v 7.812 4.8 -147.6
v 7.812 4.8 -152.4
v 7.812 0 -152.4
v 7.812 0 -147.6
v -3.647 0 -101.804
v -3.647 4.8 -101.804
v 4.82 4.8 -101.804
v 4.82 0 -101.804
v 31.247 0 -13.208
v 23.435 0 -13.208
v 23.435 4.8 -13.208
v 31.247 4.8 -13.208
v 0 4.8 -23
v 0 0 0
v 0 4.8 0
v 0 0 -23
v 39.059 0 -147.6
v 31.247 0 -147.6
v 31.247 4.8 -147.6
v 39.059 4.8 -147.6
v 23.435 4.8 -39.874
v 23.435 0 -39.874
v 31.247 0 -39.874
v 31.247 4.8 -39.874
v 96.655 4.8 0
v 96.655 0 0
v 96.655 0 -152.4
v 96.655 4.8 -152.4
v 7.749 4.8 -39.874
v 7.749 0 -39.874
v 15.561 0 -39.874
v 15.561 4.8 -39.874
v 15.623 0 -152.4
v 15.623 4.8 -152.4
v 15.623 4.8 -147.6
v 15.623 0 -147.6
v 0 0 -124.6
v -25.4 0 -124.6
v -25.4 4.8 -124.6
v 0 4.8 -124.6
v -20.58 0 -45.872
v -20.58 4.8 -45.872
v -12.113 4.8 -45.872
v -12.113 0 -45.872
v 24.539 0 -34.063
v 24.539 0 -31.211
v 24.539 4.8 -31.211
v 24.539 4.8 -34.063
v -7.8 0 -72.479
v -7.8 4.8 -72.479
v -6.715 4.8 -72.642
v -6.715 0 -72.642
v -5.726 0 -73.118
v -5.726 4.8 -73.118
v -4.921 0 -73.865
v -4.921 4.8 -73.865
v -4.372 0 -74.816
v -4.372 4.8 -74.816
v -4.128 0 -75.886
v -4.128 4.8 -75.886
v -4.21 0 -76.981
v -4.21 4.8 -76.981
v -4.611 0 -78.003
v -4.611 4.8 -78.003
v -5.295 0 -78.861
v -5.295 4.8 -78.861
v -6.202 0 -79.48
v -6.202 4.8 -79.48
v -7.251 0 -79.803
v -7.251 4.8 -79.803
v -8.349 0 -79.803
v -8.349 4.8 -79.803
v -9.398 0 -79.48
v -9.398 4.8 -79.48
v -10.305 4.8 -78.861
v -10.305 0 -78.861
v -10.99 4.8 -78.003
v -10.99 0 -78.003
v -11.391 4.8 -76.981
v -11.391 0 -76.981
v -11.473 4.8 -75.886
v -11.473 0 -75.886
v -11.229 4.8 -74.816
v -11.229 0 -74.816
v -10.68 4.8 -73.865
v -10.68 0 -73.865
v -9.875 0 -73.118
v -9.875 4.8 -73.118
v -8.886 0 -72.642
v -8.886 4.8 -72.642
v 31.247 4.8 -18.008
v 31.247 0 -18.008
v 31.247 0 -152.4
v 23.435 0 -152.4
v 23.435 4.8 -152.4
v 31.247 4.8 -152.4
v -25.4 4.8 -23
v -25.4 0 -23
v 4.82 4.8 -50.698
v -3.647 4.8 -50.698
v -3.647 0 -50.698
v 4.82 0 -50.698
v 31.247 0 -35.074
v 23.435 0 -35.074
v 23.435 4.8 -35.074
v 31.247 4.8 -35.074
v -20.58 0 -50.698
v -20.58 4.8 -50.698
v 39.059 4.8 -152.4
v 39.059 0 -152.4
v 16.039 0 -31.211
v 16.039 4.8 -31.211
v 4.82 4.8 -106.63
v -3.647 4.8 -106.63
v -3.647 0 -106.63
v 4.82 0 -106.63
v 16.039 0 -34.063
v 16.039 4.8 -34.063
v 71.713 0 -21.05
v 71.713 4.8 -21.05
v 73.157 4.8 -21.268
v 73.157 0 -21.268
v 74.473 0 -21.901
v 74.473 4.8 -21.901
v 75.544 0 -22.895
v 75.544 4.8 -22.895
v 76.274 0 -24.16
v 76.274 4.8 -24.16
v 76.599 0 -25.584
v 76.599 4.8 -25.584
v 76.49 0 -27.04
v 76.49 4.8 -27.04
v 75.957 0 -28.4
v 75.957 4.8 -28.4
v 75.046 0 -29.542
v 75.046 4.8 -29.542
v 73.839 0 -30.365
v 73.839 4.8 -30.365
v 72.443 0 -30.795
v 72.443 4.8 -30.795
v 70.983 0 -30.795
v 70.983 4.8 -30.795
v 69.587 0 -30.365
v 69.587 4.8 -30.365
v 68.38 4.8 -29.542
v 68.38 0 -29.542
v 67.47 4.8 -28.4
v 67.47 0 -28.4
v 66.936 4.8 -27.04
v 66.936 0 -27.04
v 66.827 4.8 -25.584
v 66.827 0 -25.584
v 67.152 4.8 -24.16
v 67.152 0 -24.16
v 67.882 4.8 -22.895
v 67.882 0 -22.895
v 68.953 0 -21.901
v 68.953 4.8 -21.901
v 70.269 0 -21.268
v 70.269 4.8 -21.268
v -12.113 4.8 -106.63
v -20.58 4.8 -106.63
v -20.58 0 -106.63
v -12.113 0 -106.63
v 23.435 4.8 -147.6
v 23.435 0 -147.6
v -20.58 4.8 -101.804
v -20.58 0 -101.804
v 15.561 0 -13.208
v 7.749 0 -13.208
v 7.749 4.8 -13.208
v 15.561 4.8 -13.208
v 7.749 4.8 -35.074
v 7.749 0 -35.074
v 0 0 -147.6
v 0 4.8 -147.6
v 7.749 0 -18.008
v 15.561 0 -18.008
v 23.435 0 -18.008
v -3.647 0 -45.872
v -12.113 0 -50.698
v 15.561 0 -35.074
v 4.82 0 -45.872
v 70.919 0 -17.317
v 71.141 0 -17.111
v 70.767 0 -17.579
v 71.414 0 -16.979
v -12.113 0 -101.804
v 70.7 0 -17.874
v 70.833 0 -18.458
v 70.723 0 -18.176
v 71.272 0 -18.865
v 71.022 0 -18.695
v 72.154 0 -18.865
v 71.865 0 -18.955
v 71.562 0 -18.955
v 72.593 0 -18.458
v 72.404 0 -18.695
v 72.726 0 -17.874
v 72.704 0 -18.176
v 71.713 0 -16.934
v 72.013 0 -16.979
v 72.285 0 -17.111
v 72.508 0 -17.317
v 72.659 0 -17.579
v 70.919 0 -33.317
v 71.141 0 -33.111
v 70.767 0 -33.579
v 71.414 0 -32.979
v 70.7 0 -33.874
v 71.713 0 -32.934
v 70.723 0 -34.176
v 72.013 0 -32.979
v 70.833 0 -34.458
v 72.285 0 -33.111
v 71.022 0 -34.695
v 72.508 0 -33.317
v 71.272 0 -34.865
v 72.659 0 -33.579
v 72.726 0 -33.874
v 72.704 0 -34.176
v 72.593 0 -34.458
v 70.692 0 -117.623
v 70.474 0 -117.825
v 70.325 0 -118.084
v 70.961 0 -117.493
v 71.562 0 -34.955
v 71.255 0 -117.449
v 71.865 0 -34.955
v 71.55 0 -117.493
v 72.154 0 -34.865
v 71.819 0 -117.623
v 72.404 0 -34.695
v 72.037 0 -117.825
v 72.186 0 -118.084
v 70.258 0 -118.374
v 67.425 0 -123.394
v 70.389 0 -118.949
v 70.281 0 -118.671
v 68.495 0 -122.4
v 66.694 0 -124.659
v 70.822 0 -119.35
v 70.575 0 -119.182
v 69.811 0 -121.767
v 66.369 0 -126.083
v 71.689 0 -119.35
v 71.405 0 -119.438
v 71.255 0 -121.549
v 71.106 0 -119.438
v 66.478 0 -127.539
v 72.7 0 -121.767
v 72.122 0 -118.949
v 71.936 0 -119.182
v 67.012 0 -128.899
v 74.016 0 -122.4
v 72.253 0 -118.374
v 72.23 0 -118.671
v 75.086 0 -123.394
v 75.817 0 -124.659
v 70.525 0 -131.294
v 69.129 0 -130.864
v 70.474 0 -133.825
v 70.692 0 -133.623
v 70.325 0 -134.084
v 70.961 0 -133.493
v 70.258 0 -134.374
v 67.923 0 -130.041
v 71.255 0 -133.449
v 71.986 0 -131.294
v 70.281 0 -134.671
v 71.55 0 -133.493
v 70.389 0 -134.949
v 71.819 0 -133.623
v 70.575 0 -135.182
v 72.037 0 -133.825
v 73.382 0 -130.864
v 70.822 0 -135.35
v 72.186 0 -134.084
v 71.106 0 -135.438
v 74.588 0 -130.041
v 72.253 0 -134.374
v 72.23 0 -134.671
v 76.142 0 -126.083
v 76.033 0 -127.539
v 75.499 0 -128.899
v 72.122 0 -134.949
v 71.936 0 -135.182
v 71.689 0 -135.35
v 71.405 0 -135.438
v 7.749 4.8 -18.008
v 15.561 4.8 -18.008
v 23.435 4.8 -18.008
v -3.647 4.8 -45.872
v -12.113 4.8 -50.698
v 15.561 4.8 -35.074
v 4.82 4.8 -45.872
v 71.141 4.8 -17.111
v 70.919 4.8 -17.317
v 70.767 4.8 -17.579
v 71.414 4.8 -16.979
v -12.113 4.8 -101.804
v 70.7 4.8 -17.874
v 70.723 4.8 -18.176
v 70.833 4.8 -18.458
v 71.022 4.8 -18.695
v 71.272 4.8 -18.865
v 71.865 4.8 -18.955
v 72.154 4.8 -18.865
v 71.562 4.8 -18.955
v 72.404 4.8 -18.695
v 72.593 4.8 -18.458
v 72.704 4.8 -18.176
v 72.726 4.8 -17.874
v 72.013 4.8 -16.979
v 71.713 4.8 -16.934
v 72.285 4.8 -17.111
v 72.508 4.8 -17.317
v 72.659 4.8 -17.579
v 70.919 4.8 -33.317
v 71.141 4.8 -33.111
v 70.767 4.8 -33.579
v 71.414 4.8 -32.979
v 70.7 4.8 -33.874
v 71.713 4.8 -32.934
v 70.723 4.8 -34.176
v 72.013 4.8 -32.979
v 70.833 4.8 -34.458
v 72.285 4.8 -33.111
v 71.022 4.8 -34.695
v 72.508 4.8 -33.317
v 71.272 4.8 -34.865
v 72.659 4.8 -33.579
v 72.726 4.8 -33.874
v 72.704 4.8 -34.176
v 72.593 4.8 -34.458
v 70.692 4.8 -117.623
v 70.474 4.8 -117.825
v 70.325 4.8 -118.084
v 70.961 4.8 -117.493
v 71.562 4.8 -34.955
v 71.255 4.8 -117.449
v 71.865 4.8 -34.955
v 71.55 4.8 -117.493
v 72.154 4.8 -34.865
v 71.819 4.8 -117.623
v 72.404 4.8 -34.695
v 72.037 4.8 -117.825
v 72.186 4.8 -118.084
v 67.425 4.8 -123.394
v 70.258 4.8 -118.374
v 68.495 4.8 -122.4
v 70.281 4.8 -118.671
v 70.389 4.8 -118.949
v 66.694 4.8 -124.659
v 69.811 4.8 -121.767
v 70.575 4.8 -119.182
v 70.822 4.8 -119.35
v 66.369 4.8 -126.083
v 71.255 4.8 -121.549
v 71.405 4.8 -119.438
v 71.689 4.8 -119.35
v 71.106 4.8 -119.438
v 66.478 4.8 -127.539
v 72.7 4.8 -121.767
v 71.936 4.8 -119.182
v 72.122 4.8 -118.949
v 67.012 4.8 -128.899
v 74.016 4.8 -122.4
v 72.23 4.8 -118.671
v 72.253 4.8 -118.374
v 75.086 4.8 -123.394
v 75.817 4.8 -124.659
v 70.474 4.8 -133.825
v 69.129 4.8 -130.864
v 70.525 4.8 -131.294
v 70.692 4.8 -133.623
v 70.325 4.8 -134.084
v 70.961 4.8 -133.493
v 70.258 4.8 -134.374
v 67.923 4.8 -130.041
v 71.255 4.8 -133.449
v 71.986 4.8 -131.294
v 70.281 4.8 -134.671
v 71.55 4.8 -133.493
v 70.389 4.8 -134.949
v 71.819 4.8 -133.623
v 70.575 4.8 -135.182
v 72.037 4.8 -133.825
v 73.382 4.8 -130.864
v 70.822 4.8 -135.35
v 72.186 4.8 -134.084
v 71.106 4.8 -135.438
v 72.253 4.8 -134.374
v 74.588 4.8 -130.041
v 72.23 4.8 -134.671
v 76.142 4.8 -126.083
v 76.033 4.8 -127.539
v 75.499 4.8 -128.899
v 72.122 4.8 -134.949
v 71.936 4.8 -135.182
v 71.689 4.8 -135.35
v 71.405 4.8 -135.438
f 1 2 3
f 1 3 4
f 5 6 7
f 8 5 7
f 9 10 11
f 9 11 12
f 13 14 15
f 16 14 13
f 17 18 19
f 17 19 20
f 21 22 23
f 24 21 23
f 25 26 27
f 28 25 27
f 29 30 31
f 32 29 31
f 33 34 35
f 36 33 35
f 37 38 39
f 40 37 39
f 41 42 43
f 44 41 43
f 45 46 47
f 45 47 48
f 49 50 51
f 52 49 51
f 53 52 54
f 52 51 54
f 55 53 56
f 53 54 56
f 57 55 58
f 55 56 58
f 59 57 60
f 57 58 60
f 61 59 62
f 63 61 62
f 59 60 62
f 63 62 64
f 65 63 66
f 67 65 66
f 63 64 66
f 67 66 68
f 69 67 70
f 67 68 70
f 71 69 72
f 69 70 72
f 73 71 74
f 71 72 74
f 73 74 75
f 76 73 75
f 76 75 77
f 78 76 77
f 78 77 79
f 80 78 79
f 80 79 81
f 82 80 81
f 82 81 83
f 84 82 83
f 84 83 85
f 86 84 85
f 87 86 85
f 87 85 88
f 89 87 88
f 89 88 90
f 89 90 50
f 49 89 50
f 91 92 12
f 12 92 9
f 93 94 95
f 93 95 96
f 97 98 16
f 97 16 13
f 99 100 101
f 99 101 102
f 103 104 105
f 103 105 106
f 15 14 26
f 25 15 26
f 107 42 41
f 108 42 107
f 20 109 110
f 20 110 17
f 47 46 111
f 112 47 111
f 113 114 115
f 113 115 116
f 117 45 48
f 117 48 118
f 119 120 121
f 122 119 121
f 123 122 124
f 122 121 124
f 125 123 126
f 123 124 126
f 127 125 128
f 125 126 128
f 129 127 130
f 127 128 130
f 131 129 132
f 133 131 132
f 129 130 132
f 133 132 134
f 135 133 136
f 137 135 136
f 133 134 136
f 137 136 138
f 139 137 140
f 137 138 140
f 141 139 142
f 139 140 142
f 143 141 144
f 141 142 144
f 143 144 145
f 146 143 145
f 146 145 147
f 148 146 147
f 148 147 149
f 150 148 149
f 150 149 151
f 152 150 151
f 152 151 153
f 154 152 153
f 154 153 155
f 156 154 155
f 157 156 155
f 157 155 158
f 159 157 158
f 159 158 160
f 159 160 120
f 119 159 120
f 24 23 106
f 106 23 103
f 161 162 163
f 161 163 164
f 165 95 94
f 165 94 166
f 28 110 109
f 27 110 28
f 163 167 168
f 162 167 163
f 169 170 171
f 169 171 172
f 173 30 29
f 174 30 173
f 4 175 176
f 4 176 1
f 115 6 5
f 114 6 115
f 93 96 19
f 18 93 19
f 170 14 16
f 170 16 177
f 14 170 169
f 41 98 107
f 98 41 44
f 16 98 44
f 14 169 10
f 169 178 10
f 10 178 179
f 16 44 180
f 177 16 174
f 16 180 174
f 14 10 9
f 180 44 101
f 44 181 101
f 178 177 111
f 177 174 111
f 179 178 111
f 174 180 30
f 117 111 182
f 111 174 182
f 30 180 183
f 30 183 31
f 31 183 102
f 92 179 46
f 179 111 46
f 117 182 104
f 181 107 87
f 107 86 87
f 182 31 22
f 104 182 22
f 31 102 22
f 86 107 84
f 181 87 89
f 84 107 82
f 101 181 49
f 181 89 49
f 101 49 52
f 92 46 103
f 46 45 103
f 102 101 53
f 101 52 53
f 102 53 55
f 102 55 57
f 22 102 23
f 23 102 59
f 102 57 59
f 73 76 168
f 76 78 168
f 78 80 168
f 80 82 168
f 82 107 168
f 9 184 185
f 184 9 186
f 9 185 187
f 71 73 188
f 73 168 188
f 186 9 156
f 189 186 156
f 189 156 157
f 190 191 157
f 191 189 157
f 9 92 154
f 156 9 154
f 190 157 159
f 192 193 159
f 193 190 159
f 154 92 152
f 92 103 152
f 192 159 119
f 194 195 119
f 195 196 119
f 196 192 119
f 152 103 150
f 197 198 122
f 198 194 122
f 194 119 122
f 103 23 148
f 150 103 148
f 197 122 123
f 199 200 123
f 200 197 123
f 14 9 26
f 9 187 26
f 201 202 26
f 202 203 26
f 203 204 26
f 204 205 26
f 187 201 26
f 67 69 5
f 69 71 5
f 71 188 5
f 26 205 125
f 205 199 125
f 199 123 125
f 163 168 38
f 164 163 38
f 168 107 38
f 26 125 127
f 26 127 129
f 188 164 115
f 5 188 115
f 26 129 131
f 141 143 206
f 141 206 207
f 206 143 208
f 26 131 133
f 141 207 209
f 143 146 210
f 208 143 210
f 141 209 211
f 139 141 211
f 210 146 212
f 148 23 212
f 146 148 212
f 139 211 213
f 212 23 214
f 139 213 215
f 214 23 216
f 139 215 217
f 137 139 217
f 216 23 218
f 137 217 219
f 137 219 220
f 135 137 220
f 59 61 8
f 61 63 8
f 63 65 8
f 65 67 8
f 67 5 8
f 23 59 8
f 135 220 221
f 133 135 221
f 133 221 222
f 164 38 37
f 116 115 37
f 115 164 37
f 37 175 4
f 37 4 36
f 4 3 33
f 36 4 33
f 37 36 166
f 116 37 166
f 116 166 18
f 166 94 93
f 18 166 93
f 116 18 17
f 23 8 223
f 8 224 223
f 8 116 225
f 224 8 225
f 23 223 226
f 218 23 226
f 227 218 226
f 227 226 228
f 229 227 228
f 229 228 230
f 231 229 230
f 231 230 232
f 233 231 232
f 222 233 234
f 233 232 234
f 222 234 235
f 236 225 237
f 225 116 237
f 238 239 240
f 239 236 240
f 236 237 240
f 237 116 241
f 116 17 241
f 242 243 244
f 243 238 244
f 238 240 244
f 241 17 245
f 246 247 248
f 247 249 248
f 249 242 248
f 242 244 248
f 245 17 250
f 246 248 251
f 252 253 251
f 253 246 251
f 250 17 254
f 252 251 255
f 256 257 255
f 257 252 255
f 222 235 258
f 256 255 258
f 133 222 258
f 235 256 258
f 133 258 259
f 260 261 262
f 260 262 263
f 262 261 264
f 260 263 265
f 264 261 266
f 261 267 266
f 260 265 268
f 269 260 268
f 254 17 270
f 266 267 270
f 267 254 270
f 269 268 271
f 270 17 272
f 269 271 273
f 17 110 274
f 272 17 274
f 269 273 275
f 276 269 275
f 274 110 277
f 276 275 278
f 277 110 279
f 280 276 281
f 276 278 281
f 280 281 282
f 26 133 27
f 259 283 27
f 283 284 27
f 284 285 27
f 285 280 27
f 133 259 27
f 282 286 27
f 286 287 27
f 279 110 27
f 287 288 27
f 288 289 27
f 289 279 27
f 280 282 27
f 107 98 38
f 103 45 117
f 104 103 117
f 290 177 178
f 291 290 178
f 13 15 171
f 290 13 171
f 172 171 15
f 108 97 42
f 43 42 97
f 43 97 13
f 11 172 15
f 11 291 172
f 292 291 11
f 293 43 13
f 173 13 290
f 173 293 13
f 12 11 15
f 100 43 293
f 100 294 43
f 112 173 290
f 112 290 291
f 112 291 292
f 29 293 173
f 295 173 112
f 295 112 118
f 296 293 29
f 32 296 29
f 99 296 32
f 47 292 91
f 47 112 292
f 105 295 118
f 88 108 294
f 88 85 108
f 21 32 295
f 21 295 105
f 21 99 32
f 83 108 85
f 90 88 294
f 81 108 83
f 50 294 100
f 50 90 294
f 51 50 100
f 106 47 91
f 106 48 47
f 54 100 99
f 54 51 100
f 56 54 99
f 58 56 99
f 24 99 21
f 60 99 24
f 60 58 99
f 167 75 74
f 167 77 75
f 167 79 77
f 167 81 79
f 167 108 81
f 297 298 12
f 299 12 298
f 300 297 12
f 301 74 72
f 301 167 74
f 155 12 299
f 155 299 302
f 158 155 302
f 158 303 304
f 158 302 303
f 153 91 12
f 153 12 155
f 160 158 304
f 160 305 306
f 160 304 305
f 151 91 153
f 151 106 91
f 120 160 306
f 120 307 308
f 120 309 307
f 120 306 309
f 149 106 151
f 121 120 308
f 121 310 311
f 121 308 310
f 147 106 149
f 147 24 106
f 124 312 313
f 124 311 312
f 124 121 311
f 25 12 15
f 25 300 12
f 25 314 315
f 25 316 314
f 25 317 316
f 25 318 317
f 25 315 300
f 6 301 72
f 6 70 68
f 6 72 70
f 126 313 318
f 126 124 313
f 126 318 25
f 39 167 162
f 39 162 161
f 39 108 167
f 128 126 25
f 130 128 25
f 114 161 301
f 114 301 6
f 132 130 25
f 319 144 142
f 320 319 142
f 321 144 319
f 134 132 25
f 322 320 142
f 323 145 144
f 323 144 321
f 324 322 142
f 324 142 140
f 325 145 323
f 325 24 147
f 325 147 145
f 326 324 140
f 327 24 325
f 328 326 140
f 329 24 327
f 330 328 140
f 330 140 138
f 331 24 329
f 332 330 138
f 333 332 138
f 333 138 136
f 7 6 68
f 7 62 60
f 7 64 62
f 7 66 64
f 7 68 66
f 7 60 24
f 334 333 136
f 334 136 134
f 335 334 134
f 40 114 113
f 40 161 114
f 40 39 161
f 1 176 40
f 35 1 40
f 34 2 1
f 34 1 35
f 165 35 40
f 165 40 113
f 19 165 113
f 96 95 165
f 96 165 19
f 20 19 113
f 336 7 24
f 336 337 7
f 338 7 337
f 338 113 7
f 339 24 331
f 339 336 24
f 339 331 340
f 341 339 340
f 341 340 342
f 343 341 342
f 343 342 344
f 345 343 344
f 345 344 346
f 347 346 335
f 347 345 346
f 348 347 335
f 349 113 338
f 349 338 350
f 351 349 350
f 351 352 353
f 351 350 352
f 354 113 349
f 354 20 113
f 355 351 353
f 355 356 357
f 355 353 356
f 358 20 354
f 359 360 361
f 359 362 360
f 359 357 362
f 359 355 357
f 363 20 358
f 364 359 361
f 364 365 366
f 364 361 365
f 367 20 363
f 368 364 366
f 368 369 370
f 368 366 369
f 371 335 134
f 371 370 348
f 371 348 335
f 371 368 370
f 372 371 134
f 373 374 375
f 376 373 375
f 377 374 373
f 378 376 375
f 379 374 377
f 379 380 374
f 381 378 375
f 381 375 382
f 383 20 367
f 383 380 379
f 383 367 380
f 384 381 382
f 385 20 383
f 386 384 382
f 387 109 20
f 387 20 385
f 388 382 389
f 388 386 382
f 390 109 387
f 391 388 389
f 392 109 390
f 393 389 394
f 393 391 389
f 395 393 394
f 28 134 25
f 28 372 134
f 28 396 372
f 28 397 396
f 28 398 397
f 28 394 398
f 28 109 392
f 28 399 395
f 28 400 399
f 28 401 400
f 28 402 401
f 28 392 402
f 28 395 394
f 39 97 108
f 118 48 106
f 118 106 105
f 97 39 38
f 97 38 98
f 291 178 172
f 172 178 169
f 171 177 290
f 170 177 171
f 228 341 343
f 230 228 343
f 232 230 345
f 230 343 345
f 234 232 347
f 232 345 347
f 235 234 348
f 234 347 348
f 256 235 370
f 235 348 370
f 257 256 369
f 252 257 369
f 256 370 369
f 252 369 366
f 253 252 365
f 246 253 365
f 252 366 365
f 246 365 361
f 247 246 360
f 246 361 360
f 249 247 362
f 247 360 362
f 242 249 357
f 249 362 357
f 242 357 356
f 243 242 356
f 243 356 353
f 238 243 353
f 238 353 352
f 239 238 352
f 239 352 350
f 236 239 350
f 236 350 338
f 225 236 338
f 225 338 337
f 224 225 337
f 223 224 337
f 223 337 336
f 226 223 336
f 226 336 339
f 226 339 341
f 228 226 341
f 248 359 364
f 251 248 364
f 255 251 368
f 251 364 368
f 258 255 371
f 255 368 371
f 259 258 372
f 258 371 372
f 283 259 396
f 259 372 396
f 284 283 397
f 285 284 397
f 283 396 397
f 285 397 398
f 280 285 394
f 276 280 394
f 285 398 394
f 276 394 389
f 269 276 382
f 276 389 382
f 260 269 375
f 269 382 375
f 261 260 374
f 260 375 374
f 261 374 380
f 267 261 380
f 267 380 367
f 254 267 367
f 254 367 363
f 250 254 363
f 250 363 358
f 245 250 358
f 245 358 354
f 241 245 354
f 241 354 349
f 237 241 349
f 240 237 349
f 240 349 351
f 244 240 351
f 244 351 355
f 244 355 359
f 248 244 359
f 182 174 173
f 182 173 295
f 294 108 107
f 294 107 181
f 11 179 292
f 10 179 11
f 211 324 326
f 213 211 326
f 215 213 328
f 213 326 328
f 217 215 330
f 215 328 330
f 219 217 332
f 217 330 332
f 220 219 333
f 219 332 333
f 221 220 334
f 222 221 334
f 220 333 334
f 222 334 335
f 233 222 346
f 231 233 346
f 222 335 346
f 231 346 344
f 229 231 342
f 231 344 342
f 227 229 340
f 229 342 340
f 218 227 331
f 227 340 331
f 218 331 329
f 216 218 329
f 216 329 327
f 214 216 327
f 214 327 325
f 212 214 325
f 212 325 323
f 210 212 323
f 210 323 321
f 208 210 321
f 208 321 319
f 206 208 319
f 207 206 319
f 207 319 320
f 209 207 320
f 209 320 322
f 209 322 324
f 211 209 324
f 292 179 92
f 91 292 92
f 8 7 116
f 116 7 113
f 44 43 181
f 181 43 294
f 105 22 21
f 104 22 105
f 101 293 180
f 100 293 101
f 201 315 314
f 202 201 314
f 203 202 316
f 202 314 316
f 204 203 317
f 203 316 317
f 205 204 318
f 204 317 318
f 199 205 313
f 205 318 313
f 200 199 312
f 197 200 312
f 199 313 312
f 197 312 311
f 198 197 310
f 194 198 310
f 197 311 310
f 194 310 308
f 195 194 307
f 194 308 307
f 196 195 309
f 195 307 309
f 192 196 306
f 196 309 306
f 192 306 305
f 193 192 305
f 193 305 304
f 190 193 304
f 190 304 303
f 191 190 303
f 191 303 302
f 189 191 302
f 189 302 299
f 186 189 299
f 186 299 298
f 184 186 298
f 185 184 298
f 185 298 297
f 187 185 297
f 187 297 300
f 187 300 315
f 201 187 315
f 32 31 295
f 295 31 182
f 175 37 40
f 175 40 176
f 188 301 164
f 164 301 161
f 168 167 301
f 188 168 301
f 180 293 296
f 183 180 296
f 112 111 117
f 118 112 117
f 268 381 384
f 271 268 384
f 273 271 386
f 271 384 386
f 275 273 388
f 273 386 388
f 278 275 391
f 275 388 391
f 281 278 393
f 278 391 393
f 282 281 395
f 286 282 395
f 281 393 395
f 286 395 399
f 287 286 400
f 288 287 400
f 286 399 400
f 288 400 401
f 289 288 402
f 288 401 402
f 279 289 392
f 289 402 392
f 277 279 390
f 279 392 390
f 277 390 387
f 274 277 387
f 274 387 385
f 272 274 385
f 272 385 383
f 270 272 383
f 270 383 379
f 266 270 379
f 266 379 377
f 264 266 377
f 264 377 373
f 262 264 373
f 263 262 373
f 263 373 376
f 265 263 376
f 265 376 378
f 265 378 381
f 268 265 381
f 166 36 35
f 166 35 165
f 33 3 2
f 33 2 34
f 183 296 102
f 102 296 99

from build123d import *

# Parameters (mm, degrees)
SKETCH1_W           = 96.655493252
SKETCH1_H           = 152.4
BOSS_EXTRUDE1_DEPTH = 4.800000052
SKETCH3_W           = 7.8117192
SKETCH3_H           = 4.800000052
CUT_EXTRUDE2_DEPTH  = 181.530009628
SKETCH5_W           = 8.5
SKETCH5_H           = 2.852224977
CUT_EXTRUDE3_DEPTH  = 181.530009628
SKETCH6_W           = 101.6
SKETCH6_H           = 4.800000052
BOSS_EXTRUDE2_DEPTH = 25.4
SKETCH7_R           = 3.683
CUT_EXTRUDE4_DEPTH  = 181.530009628
SKETCH8_W           = 8.466666666
SKETCH8_H           = 4.826
SKETCH8_W_2         = 8.466666667
CUT_EXTRUDE5_DEPTH  = 181.530009628
SKETCH9_R           = 1.00000054
SKETCH9_R_2         = 1
SKETCH9_R_3         = 1.016
SKETCH9_R_4         = 4.899999979
CUT_EXTRUDE6_DEPTH  = 181.530009628


with BuildPart() as part:
    # Sketch1 → Boss-Extrude1 (new body)
    with BuildSketch(Plane(origin=(0, 0, 0), x_dir=(1, 0, 0), z_dir=(0, 1, 0))):
        with Locations((48.327746626, 76.2)):
            Rectangle(SKETCH1_W, SKETCH1_H)
    extrude(amount=BOSS_EXTRUDE1_DEPTH)

    # Sketch3 → Cut-Extrude2 (cut, through all)
    with BuildSketch(Plane.XZ):
        with Locations((3.9058596, -149.999999974)):
            Rectangle(SKETCH3_W, SKETCH3_H)
        with Locations((19.529298, -149.999999974)):
            Rectangle(SKETCH3_W, SKETCH3_H)
        with Locations((35.1527364, -149.999999974)):
            Rectangle(SKETCH3_W, SKETCH3_H)
        with Locations((27.3410172, -37.473737167)):
            Rectangle(SKETCH3_W, SKETCH3_H)
        with Locations((11.655298, -37.473737167)):
            Rectangle(SKETCH3_W, SKETCH3_H)
        with Locations((11.655298, -15.608000026)):
            Rectangle(SKETCH3_W, SKETCH3_H)
        with Locations((27.3410172, -15.608000026)):
            Rectangle(SKETCH3_W, SKETCH3_H)
    extrude(amount=-CUT_EXTRUDE2_DEPTH, mode=Mode.SUBTRACT)

    # Sketch5 → Cut-Extrude3 (cut, through all)
    with BuildSketch(Plane(origin=(0, 0, 0), x_dir=(-1, 0, 0), z_dir=(0, -1, 0))):
        with Locations((-20.288559041, 32.636660711)):
            Rectangle(SKETCH5_W, SKETCH5_H)
    extrude(amount=-CUT_EXTRUDE3_DEPTH, mode=Mode.SUBTRACT)

    # Sketch6 → Boss-Extrude2 (add)
    with BuildSketch(Plane.ZY):
        with Locations((-73.799999974, 2.400000026)):
            Rectangle(SKETCH6_W, SKETCH6_H)
    extrude(amount=BOSS_EXTRUDE2_DEPTH)

    # Sketch7 → Cut-Extrude4 (cut, through all)
    with BuildSketch(Plane(origin=(0, 4.800000052, 0), x_dir=(1, 0, 0), z_dir=(0, 1, 0))):
        with Locations(Location((-7.800402362, 76.161515735, 0), (0, 0, 270))):
            Circle(SKETCH7_R)
    extrude(amount=-CUT_EXTRUDE4_DEPTH, mode=Mode.SUBTRACT)

    # Sketch8 → Cut-Extrude5 (cut, through all)
    with BuildSketch(Plane(origin=(0, 4.800000052, 0), x_dir=(1, 0, 0), z_dir=(0, 1, 0))):
        with Locations((-16.346648987, 48.284809597)):
            Rectangle(SKETCH8_W, SKETCH8_H)
        with Locations((0.586684347, 48.284809597)):
            Rectangle(SKETCH8_W_2, SKETCH8_H)
        with Locations((-16.346648987, 104.21722165)):
            Rectangle(SKETCH8_W, SKETCH8_H)
        with Locations((0.586684347, 104.21722165)):
            Rectangle(SKETCH8_W_2, SKETCH8_H)
    extrude(amount=-CUT_EXTRUDE5_DEPTH, mode=Mode.SUBTRACT)

    # Sketch9 → Cut-Extrude6 (cut, through all)
    with BuildSketch(Plane(origin=(0, 4.800000052, 0), x_dir=(1, 0, 0), z_dir=(0, 1, 0))):
        with Locations(Location((71.255493252, 118.448957867, 0), (0, 0, 270))):
            Circle(SKETCH9_R)
        with Locations(Location((71.255493252, 134.448957871, 0), (0, 0, 270))):
            Circle(SKETCH9_R_2)
        with Locations(Location((71.713159771, 33.950000045, 0), (0, 0, 270))):
            Circle(SKETCH9_R_3)
        with Locations(Location((71.713159771, 17.950000041, 0), (0, 0, 270))):
            Circle(SKETCH9_R_3)
        with Locations(Location((71.713159771, 25.950000043, 0), (0, 0, 270))):
            Circle(SKETCH9_R_4)
        with Locations(Location((71.255493252, 126.448957869, 0), (0, 0, 270))):
            Circle(SKETCH9_R_4)
    extrude(amount=-CUT_EXTRUDE6_DEPTH, mode=Mode.SUBTRACT)


solid = part.part
